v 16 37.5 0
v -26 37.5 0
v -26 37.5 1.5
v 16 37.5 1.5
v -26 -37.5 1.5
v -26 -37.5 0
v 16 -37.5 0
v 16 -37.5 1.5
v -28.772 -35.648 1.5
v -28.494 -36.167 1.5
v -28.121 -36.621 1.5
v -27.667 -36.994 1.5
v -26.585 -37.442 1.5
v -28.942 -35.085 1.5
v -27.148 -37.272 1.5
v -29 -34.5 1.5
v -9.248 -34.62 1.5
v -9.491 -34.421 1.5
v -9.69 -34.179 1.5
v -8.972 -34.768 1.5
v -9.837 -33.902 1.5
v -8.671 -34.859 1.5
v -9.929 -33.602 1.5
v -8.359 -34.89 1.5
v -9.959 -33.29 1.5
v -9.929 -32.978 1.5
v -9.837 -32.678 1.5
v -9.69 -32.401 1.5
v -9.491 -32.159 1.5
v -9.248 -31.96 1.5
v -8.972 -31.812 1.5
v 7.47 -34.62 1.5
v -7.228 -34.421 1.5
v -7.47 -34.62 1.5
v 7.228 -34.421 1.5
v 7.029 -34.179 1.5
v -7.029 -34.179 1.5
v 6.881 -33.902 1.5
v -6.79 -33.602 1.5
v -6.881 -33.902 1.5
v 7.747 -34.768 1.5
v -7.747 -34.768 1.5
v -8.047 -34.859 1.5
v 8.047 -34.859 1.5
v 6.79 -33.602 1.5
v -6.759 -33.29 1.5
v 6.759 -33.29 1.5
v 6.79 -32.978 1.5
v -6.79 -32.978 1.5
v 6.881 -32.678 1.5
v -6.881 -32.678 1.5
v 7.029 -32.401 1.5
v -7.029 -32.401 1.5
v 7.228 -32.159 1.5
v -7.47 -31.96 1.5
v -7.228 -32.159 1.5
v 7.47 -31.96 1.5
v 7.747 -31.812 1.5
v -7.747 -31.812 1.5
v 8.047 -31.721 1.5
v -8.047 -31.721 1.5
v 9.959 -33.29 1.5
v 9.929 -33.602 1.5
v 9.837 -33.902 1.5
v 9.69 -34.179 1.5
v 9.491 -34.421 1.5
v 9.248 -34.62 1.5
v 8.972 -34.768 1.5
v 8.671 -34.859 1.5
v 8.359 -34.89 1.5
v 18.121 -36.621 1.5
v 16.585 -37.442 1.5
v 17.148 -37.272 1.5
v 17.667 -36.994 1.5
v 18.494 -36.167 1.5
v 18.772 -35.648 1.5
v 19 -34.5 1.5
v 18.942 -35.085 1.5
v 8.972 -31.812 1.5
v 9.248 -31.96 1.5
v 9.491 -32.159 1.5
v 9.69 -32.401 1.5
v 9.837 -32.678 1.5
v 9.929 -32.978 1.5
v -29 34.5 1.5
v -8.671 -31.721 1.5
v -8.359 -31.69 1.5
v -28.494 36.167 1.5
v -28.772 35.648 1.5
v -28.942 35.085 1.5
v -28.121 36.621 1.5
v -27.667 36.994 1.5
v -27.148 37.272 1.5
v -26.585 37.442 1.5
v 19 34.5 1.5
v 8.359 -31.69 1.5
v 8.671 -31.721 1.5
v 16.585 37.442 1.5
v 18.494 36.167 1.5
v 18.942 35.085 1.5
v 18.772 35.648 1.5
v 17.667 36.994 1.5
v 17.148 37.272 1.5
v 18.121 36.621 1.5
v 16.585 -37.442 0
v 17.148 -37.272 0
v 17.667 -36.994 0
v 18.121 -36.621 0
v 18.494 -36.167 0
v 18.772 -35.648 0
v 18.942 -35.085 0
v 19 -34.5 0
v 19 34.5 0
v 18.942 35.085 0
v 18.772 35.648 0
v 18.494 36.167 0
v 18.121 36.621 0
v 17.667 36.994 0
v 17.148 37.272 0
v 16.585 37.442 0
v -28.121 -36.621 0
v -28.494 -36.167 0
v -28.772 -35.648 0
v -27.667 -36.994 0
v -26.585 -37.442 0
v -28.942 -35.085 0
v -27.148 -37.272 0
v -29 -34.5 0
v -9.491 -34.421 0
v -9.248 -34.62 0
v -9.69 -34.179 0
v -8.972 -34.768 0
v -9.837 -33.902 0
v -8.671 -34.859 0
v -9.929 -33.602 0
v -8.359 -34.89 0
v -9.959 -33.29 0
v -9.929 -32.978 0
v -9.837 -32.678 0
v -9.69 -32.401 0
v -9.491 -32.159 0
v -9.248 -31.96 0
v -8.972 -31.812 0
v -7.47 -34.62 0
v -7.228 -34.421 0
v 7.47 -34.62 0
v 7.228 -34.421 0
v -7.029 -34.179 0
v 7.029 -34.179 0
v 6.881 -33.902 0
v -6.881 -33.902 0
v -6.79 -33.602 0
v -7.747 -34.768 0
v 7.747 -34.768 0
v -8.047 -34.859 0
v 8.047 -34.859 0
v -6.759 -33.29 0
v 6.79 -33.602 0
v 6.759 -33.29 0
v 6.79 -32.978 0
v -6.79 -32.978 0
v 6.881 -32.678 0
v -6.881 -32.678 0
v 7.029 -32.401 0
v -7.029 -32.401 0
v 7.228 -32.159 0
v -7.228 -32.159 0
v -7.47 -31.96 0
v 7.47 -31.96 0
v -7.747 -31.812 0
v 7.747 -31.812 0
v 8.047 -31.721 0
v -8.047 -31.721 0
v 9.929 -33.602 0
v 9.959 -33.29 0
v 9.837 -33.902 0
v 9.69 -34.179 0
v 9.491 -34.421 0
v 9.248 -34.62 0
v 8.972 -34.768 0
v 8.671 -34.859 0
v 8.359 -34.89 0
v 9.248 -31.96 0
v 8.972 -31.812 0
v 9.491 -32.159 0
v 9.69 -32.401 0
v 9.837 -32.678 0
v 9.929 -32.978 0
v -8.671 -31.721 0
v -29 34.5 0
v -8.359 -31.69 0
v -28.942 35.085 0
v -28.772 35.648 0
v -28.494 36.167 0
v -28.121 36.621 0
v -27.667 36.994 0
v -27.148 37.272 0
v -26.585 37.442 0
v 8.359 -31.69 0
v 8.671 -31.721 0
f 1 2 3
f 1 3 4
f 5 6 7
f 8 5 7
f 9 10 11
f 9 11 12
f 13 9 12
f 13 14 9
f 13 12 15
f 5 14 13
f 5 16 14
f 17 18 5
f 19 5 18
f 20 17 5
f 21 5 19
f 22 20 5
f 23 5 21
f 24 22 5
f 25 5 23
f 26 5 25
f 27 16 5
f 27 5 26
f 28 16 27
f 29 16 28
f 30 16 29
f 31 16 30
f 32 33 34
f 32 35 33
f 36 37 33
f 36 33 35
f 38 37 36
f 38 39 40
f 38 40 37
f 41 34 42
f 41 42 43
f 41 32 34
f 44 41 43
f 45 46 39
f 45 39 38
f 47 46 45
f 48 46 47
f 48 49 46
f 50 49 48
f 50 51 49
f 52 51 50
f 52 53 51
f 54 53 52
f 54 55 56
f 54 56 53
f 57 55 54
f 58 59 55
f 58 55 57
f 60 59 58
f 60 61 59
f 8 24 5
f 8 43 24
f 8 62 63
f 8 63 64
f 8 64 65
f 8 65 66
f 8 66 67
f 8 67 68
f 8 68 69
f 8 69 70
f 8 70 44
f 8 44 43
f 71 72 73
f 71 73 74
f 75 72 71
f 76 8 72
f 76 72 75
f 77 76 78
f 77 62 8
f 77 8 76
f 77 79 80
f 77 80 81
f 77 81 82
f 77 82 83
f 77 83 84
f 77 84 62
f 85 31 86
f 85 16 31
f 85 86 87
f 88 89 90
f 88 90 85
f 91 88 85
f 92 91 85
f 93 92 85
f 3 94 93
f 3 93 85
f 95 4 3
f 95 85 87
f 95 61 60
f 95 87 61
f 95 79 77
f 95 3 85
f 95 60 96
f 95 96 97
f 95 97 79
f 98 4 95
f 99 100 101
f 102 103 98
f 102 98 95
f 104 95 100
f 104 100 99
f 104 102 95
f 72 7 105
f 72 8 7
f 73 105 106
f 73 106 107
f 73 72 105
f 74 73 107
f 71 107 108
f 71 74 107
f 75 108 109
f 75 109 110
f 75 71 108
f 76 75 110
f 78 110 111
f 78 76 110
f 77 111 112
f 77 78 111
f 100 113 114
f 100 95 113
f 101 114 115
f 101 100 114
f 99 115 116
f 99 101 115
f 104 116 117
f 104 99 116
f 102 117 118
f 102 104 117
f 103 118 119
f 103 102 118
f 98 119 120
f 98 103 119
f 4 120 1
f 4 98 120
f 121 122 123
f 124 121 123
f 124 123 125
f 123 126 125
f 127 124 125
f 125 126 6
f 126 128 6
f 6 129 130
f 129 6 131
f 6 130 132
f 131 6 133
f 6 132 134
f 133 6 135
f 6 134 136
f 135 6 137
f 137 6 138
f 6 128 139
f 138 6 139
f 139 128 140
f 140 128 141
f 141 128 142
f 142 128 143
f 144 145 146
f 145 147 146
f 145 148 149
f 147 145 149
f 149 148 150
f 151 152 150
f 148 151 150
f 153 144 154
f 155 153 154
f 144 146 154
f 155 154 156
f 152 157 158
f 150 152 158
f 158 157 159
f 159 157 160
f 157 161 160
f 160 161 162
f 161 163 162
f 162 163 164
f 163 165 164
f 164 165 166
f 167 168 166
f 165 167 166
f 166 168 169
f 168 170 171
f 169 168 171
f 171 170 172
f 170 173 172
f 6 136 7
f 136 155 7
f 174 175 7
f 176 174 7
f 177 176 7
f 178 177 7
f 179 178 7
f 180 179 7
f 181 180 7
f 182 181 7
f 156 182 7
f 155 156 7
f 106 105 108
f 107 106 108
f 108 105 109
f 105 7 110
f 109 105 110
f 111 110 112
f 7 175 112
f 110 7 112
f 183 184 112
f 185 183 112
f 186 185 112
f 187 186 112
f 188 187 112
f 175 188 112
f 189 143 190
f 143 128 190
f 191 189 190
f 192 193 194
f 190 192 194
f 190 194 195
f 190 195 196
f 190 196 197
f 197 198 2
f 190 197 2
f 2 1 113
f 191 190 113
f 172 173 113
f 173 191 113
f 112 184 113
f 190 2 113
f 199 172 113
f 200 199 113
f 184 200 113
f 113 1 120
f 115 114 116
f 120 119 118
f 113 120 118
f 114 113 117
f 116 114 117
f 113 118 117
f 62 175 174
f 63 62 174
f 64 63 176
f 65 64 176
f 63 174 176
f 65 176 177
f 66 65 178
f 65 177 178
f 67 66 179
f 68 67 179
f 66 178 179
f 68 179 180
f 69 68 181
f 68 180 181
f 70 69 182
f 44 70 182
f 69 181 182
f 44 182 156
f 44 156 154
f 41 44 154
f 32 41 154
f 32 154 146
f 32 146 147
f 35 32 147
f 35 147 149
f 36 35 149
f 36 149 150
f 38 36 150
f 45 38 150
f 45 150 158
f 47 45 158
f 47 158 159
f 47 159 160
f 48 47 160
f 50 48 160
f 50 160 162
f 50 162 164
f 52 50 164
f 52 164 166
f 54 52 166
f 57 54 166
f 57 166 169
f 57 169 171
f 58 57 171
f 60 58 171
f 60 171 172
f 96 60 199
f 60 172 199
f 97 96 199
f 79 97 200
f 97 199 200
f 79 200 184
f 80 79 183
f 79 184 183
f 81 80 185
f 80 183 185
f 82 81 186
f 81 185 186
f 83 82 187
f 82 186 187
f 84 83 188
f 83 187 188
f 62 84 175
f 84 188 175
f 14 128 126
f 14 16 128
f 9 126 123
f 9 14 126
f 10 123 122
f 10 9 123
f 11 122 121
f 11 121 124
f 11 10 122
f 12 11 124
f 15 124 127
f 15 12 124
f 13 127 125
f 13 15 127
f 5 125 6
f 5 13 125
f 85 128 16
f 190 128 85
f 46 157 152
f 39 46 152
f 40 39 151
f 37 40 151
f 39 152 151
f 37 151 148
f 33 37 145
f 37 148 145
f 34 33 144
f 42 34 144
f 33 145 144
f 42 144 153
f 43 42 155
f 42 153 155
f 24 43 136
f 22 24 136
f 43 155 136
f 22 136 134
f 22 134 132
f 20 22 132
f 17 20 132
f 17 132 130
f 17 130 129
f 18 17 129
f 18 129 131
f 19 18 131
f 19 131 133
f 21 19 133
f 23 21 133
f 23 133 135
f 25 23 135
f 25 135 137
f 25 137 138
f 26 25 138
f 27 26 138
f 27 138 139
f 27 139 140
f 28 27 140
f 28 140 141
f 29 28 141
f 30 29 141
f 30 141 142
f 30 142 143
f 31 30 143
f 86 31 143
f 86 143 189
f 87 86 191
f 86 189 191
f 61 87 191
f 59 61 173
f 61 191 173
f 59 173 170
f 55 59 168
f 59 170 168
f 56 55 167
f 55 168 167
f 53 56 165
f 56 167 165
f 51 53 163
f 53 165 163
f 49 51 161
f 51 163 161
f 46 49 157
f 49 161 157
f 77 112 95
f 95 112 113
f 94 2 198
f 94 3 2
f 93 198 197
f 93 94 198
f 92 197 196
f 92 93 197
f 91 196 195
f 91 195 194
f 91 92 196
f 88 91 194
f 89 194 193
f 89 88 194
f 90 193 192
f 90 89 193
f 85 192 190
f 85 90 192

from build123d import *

# Parameters (mm, degrees)
SKETCH_W        = 48
SKETCH_H        = 75
PAD_DEPTH       = 1.5
FILLET014_R     = 3
FILLET015_R     = 3
FILLET016_R     = 3
FILLET017_R     = 3
SKETCH016_R     = 1.6
POCKET012_DEPTH = 1.501


with BuildPart() as part:
    # Sketch → Pad (new body)
    with BuildSketch(Plane.XY):
        with Locations((-5, 0)):
            Rectangle(SKETCH_W, SKETCH_H)
    extrude(amount=PAD_DEPTH)

    # Fillet014
    fillet014_edges = [part.edges().sort_by_distance(p)[0] for p in [
        (19, 37.5, 0.75),
    ]]
    fillet(fillet014_edges, radius=FILLET014_R)

    # Fillet015
    fillet015_edges = [part.edges().sort_by_distance(p)[0] for p in [
        (-29, 37.5, 0.75),
    ]]
    fillet(fillet015_edges, radius=FILLET015_R)

    # Fillet016
    fillet016_edges = [part.edges().sort_by_distance(p)[0] for p in [
        (-29, -37.5, 0.75),
    ]]
    fillet(fillet016_edges, radius=FILLET016_R)

    # Fillet017
    fillet017_edges = [part.edges().sort_by_distance(p)[0] for p in [
        (19, -37.5, 0.75),
    ]]
    fillet(fillet017_edges, radius=FILLET017_R)

    # Sketch016 → Pocket012 (cut, through all)
    with BuildSketch(Plane(origin=(0, 0, 0), x_dir=(1, 0, 0), z_dir=(0, 0, -1))):
        with Locations((-8.35928, 33.2899)):
            Circle(SKETCH016_R)
        with Locations((8.35928, 33.2899)):
            Circle(SKETCH016_R)
    extrude(amount=-POCKET012_DEPTH, mode=Mode.SUBTRACT)


solid = part.part
